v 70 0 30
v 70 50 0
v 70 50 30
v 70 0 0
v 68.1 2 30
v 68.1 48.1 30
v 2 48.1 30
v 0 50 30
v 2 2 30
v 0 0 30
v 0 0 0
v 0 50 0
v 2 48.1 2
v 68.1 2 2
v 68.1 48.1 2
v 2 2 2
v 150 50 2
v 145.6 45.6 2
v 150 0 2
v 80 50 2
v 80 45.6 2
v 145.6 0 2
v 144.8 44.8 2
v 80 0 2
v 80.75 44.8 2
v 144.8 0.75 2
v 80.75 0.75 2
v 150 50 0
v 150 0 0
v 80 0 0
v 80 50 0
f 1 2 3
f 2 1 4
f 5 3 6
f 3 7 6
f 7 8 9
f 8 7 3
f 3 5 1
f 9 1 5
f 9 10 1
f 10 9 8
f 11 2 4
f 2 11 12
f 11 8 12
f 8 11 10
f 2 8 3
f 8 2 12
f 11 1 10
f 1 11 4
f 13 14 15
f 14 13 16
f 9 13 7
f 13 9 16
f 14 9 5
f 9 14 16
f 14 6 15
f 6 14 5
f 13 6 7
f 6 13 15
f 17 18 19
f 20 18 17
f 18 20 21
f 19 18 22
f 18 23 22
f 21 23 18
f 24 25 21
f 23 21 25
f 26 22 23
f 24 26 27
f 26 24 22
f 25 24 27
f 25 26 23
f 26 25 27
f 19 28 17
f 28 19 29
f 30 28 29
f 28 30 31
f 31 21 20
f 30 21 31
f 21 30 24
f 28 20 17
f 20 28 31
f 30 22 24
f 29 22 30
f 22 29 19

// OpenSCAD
// Two-part enclosure for small electronics board
// Part 1: Box (left)
// Part 2: Lid (right, printed upside down)
// Prints together with a 10 mm gap.

$fn = 64;

// --- Dimensions ---

// Part 1: Box
// Outer dimensions (X x Y x Z)
BOX_OUT_X = 70;
BOX_OUT_Y = 50;
BOX_OUT_Z = 30;
// Wall thicknesses
BOX_WALL_THICK = 2;
BOX_FLOOR_THICK = 2;

// Part 2: Lid
// Base plate dimensions
LID_PLATE_X = 70;
LID_PLATE_Y = 50;
LID_PLATE_THICK = 2;
// Lip dimensions (outer size of the lip)
LIP_OUT_X = 65.6;
LIP_OUT_Y = 45.6;
LIP_THICK = 1.5;
LIP_HEIGHT = 4;
// Clearance check (calculated for verification)
// Box inner width = 70 - 2*2 = 66
// Lip outer width = 65.6
// Clearance = (66 - 65.6) / 2 = 0.2 mm per side. Correct.

// Layout
// 10 mm gap between parts
GAP = 10;

// --- Part 1: The Box ---
// Rests on XY plane, centered on origin.
// Dimensions: 70 x 50 x 30
// Walls: 2mm, Floor: 2mm, Open top.

translate([0, 0, 0])
difference() {
    // Outer block
    cube([BOX_OUT_X, BOX_OUT_Y, BOX_OUT_Z], center = false);
    
    // Cut out the inside (hollow)
    // Inner X = 70 - 2*2 = 66
    // Inner Y = 50 - 2*2 = 46
    // Inner Z = 30 - 2 (floor) = 28
    translate([BOX_WALL_THICK, BOX_WALL_THICK, BOX_FLOOR_THICK])
    cube([
        BOX_OUT_X - (2 * BOX_WALL_THICK),
        BOX_OUT_Y - (2 * BOX_WALL_THICK),
        BOX_OUT_Z - BOX_FLOOR_THICK
    ], center = false);
    
    // Extend cut slightly to ensure clean separation from walls
    translate([BOX_WALL_THICK, BOX_WALL_THICK, BOX_FLOOR_THICK])
    cube([
        BOX_OUT_X - (2 * BOX_WALL_THICK) + 0.1,
        BOX_OUT_Y - (2 * BOX_WALL_THICK) + 0.1,
        BOX_OUT_Z - BOX_FLOOR_THICK + 0.1
    ], center = false);
}

// --- Part 2: The Lid ---
// Printed upside down.
// Base plate: 70 x 50 x 2 mm.
// Lip: 1.5 mm thick wall, 4 mm tall.
// Lip outer size: 65.6 x 45.6 mm.
// Position: On the +X side of the box (centered vertically on the bed).
// Since the box is centered at X=0, and the gap is 10mm, the box occupies X=-35 to X=35.
// The gap is X=35 to X=45.
// The lid should start at X=45.
// Lid width = 70. Center of lid = 45 + 35 = 80.
// So translate X by 80.

translate([80, 0, 0])
difference() {
    // 1. The Base Plate
    // Dimensions: 70 x 50 x 2
    cube([LID_PLATE_X, LID_PLATE_Y, LID_PLATE_THICK], center = false);
    
    // 2. The Lip (printed upside down, so it hangs "down" from the top face of the plate)
    // The lip is a rectangular wall.
    // Outer size: 65.6 x 45.6
    // Thickness: 1.5
    // Height: 4
    // It sits on top of the plate (Z=2 relative to plate start).
    
    // Calculate inner dimensions of the lip hole
    LIP_IN_X = LIP_OUT_X - LIP_THICK;
    LIP_IN_Y = LIP_OUT_Y - LIP_THICK;
    
    // Position of the lip relative to the plate center
    // Plate is centered at 0,0 relative to itself.
    // Lip is centered on the plate.
    translate([0, 0, LID_PLATE_THICK])
    // The lip is a hollow box shape (a frame)
    difference() {
        // Outer volume of the lip
        cube([LIP_OUT_X, LIP_OUT_Y, LIP_HEIGHT], center = false);
        
        // Inner void of the lip
        // Extend slightly past the face to ensure clean cut
        translate([LIP_THICK/2, LIP_THICK/2, 0])
        cube([
            LIP_IN_X - 0.05,
            LIP_IN_Y - 0.05,
            LIP_HEIGHT + 0.05
        ], center = false);
    }
}
